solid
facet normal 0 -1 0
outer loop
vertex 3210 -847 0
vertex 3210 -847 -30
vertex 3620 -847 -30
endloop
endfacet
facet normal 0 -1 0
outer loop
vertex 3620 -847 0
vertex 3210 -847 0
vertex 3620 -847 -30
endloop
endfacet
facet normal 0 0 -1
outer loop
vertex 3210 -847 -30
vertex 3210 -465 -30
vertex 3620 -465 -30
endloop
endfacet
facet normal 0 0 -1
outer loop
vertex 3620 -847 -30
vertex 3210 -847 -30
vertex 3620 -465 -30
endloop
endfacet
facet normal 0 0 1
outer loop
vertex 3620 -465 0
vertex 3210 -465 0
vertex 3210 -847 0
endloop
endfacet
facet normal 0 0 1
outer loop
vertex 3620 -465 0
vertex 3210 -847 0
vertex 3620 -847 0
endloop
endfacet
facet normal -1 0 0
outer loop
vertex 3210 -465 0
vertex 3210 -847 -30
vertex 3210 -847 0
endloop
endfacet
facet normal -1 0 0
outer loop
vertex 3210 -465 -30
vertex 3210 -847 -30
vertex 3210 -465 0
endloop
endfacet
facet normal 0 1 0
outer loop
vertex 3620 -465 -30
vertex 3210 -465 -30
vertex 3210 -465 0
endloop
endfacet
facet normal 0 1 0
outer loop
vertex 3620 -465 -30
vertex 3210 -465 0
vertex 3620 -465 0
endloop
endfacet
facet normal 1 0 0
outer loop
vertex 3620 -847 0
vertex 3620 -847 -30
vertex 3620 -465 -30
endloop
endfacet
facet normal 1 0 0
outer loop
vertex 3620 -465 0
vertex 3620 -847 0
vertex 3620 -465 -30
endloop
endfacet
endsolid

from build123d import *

# Parameters (mm, degrees)
TABAN_FLAN_1_DEPTH          = 30
KES_EKSTR_ZYON1_DEPTH       = 6325.626471184
KES_EKSTR_ZYON1_DEPTH_BACK  = 6325.626471184
IZIM2_W                     = 3213
IZIM2_H                     = 310
IZIM3_W                     = 24
IZIM3_H                     = 2000
SEKME1_DEPTH                = 30
KES_EKSTR_ZYON2_DEPTH       = 6348.399152409
KES_EKSTR_ZYON2_DEPTH_BACK  = 6348.399152409
IZIM4_W                     = 3210
IZIM4_H                     = 305
KES_EKSTR_ZYON3_DEPTH       = 6348.399152409
KES_EKSTR_ZYON3_DEPTH_BACK  = 6348.399152409
IZIM5_W                     = 3210
IZIM5_H                     = 405
KES_EKSTR_ZYON4_DEPTH       = 6348.399152409
KES_EKSTR_ZYON4_DEPTH_BACK  = 6348.399152409
IZIM6_W                     = 2910
IZIM6_H                     = 310
IZIM6_W_2                   = 300
IZIM7_W                     = 2811
IZIM7_H                     = 5
SEKME2_DEPTH                = 30
CUT_EXTRUDE1_DEPTH          = 6349.976374188
CUT_EXTRUDE1_DEPTH_BACK     = 6349.976374188
SKETCH1_W                   = 2835
SKETCH1_H                   = 1158
KES_EKSTR_ZYON5_DEPTH       = 6084.328447487
KES_EKSTR_ZYON5_DEPTH_BACK  = 6084.328447487
IZIM9_W                     = 2635
IZIM9_H                     = 310
IZIM10_W                    = 575
IZIM10_H                    = 2
SEKME3_DEPTH                = 30
KES_EKSTR_ZYON6_DEPTH       = 6084.328447487
KES_EKSTR_ZYON6_DEPTH_BACK  = 6084.328447487
IZIM13_W                    = 575
IZIM13_H                    = 2
KES_EKSTR_ZYON7_DEPTH       = 6084.328447487
KES_EKSTR_ZYON7_DEPTH_BACK  = 6084.328447487
KES_EKSTR_ZYON8_DEPTH       = 5441.42139912
KES_EKSTR_ZYON8_DEPTH_BACK  = 5441.42139912
IZIM16_W                    = 4
IZIM16_H                    = 537
KES_EKSTR_ZYON9_DEPTH       = 5437.470270313
KES_EKSTR_ZYON9_DEPTH_BACK  = 5437.470270313
IZIM17_W                    = 1750
IZIM17_H                    = 537
KES_EKSTR_ZYON10_DEPTH      = 3718.890396448
KES_EKSTR_ZYON10_DEPTH_BACK = 3718.890396448
IZIM18_W                    = 410
IZIM18_H                    = 155


# Sheet-metal steps are written as plain solids
with BuildPart() as part:
    # Çizim1 → Taban-Flanş1 (new body)
    with BuildSketch(Plane.XY):
        Polygon((0, 0), (0, -1640), (3210, -1640), (3210, -2000), (6000, -2000), (6000, 0), align=None)
    extrude(amount=-TABAN_FLAN_1_DEPTH)

    # Çizim2 → Kes-Ekstrüzyon1 (cut, two sides: drawn at the far end of the back side and taken through both)
    with BuildSketch(Plane.XY.offset(-KES_EKSTR_ZYON1_DEPTH_BACK)):
        with Locations((1606.5, -1485)):
            Rectangle(IZIM2_W, IZIM2_H)
    extrude(amount=KES_EKSTR_ZYON1_DEPTH + KES_EKSTR_ZYON1_DEPTH_BACK, mode=Mode.SUBTRACT)

    # Çizim3 → Sekme1 (add)
    with BuildSketch(Plane.XY):
        with Locations((6012, -1000)):
            Rectangle(IZIM3_W, IZIM3_H)
    extrude(amount=-SEKME1_DEPTH)

    # Çizim4 → Kes-Ekstrüzyon2 (cut, two sides: drawn at the far end of the back side and taken through both)
    with BuildSketch(Plane.XY.offset(-KES_EKSTR_ZYON2_DEPTH_BACK)):
        with Locations((1605, -1177.5)):
            Rectangle(IZIM4_W, IZIM4_H)
    extrude(amount=KES_EKSTR_ZYON2_DEPTH + KES_EKSTR_ZYON2_DEPTH_BACK, mode=Mode.SUBTRACT)

    # Çizim5 → Kes-Ekstrüzyon3 (cut, two sides: drawn at the far end of the back side and taken through both)
    with BuildSketch(Plane.XY.offset(-KES_EKSTR_ZYON3_DEPTH_BACK)):
        with Locations((1605, -822.5)):
            Rectangle(IZIM5_W, IZIM5_H)
    extrude(amount=KES_EKSTR_ZYON3_DEPTH + KES_EKSTR_ZYON3_DEPTH_BACK, mode=Mode.SUBTRACT)

    # Çizim6 → Kes-Ekstrüzyon4 (cut, two sides: drawn at the far end of the back side and taken through both)
    with BuildSketch(Plane.XY.offset(-KES_EKSTR_ZYON4_DEPTH_BACK)):
        with Locations((1455, -465)):
            Rectangle(IZIM6_W, IZIM6_H)
        with Locations((3060, -465)):
            Rectangle(IZIM6_W_2, IZIM6_H)
    extrude(amount=KES_EKSTR_ZYON4_DEPTH + KES_EKSTR_ZYON4_DEPTH_BACK, mode=Mode.SUBTRACT)

    # Çizim7 → Sekme2 (add)
    with BuildSketch(Plane.XY):
        with Locations((4618.5, -2002.5)):
            Rectangle(IZIM7_W, IZIM7_H)
    extrude(amount=-SEKME2_DEPTH)

    # Sketch1 → Cut-Extrude1 (cut, two sides: drawn at the far end of the back side and taken through both)
    with BuildSketch(Plane.XY.offset(-CUT_EXTRUDE1_DEPTH_BACK)):
        with Locations((4627.5, -1426)):
            Rectangle(SKETCH1_W, SKETCH1_H)
    extrude(amount=CUT_EXTRUDE1_DEPTH + CUT_EXTRUDE1_DEPTH_BACK, mode=Mode.SUBTRACT)

    # Çizim9 → Kes-Ekstrüzyon5 (cut, two sides: drawn at the far end of the back side and taken through both)
    with BuildSketch(Plane.XY.offset(-KES_EKSTR_ZYON5_DEPTH_BACK)):
        with Locations((1317.5, -155)):
            Rectangle(IZIM9_W, IZIM9_H)
    extrude(amount=KES_EKSTR_ZYON5_DEPTH + KES_EKSTR_ZYON5_DEPTH_BACK, mode=Mode.SUBTRACT)

    # Çizim10 → Sekme3 (add)
    with BuildSketch(Plane.XY):
        with Locations((2922.5, -311)):
            Rectangle(IZIM10_W, IZIM10_H)
    extrude(amount=-SEKME3_DEPTH)

    # Çizim13 → Kes-Ekstrüzyon6 (cut, two sides: drawn at the far end of the back side and taken through both)
    with BuildSketch(Plane.XY.offset(-KES_EKSTR_ZYON6_DEPTH_BACK)):
        Polygon((5145, 0), (2635, 0), (2635, -310), (3210, -310), (5145, -310), align=None)
        with Locations((2922.5, -311)):
            Rectangle(IZIM13_W, IZIM13_H)
    extrude(amount=KES_EKSTR_ZYON6_DEPTH + KES_EKSTR_ZYON6_DEPTH_BACK, mode=Mode.SUBTRACT)

    # Çizim15 → Kes-Ekstrüzyon7 (cut, two sides: drawn at the far end of the back side and taken through both)
    with BuildSketch(Plane.XY.offset(-KES_EKSTR_ZYON7_DEPTH_BACK)):
        Polygon((5145, 0), (5145, -310), (5374, -310), (5374, -847), (6024, -847), (6024, 0), align=None)
    extrude(amount=KES_EKSTR_ZYON7_DEPTH + KES_EKSTR_ZYON7_DEPTH_BACK, mode=Mode.SUBTRACT)

    # Çizim16 → Kes-Ekstrüzyon8 (cut, two sides: drawn at the far end of the back side and taken through both)
    with BuildSketch(Plane.XY.offset(-KES_EKSTR_ZYON8_DEPTH_BACK)):
        with Locations((5372, -578.5)):
            Rectangle(IZIM16_W, IZIM16_H)
    extrude(amount=KES_EKSTR_ZYON8_DEPTH + KES_EKSTR_ZYON8_DEPTH_BACK, mode=Mode.SUBTRACT)

    # Çizim17 → Kes-Ekstrüzyon9 (cut, two sides: drawn at the far end of the back side and taken through both)
    with BuildSketch(Plane.XY.offset(-KES_EKSTR_ZYON9_DEPTH_BACK)):
        with Locations((4495, -578.5)):
            Rectangle(IZIM17_W, IZIM17_H)
    extrude(amount=KES_EKSTR_ZYON9_DEPTH + KES_EKSTR_ZYON9_DEPTH_BACK, mode=Mode.SUBTRACT)

    # Çizim18 → Kes-Ekstrüzyon10 (cut, two sides: drawn at the far end of the back side and taken through both)
    with BuildSketch(Plane.XY.offset(-KES_EKSTR_ZYON10_DEPTH_BACK)):
        with Locations((3415, -387.5)):
            Rectangle(IZIM18_W, IZIM18_H)
    extrude(amount=KES_EKSTR_ZYON10_DEPTH + KES_EKSTR_ZYON10_DEPTH_BACK, mode=Mode.SUBTRACT)


solid = part.part
